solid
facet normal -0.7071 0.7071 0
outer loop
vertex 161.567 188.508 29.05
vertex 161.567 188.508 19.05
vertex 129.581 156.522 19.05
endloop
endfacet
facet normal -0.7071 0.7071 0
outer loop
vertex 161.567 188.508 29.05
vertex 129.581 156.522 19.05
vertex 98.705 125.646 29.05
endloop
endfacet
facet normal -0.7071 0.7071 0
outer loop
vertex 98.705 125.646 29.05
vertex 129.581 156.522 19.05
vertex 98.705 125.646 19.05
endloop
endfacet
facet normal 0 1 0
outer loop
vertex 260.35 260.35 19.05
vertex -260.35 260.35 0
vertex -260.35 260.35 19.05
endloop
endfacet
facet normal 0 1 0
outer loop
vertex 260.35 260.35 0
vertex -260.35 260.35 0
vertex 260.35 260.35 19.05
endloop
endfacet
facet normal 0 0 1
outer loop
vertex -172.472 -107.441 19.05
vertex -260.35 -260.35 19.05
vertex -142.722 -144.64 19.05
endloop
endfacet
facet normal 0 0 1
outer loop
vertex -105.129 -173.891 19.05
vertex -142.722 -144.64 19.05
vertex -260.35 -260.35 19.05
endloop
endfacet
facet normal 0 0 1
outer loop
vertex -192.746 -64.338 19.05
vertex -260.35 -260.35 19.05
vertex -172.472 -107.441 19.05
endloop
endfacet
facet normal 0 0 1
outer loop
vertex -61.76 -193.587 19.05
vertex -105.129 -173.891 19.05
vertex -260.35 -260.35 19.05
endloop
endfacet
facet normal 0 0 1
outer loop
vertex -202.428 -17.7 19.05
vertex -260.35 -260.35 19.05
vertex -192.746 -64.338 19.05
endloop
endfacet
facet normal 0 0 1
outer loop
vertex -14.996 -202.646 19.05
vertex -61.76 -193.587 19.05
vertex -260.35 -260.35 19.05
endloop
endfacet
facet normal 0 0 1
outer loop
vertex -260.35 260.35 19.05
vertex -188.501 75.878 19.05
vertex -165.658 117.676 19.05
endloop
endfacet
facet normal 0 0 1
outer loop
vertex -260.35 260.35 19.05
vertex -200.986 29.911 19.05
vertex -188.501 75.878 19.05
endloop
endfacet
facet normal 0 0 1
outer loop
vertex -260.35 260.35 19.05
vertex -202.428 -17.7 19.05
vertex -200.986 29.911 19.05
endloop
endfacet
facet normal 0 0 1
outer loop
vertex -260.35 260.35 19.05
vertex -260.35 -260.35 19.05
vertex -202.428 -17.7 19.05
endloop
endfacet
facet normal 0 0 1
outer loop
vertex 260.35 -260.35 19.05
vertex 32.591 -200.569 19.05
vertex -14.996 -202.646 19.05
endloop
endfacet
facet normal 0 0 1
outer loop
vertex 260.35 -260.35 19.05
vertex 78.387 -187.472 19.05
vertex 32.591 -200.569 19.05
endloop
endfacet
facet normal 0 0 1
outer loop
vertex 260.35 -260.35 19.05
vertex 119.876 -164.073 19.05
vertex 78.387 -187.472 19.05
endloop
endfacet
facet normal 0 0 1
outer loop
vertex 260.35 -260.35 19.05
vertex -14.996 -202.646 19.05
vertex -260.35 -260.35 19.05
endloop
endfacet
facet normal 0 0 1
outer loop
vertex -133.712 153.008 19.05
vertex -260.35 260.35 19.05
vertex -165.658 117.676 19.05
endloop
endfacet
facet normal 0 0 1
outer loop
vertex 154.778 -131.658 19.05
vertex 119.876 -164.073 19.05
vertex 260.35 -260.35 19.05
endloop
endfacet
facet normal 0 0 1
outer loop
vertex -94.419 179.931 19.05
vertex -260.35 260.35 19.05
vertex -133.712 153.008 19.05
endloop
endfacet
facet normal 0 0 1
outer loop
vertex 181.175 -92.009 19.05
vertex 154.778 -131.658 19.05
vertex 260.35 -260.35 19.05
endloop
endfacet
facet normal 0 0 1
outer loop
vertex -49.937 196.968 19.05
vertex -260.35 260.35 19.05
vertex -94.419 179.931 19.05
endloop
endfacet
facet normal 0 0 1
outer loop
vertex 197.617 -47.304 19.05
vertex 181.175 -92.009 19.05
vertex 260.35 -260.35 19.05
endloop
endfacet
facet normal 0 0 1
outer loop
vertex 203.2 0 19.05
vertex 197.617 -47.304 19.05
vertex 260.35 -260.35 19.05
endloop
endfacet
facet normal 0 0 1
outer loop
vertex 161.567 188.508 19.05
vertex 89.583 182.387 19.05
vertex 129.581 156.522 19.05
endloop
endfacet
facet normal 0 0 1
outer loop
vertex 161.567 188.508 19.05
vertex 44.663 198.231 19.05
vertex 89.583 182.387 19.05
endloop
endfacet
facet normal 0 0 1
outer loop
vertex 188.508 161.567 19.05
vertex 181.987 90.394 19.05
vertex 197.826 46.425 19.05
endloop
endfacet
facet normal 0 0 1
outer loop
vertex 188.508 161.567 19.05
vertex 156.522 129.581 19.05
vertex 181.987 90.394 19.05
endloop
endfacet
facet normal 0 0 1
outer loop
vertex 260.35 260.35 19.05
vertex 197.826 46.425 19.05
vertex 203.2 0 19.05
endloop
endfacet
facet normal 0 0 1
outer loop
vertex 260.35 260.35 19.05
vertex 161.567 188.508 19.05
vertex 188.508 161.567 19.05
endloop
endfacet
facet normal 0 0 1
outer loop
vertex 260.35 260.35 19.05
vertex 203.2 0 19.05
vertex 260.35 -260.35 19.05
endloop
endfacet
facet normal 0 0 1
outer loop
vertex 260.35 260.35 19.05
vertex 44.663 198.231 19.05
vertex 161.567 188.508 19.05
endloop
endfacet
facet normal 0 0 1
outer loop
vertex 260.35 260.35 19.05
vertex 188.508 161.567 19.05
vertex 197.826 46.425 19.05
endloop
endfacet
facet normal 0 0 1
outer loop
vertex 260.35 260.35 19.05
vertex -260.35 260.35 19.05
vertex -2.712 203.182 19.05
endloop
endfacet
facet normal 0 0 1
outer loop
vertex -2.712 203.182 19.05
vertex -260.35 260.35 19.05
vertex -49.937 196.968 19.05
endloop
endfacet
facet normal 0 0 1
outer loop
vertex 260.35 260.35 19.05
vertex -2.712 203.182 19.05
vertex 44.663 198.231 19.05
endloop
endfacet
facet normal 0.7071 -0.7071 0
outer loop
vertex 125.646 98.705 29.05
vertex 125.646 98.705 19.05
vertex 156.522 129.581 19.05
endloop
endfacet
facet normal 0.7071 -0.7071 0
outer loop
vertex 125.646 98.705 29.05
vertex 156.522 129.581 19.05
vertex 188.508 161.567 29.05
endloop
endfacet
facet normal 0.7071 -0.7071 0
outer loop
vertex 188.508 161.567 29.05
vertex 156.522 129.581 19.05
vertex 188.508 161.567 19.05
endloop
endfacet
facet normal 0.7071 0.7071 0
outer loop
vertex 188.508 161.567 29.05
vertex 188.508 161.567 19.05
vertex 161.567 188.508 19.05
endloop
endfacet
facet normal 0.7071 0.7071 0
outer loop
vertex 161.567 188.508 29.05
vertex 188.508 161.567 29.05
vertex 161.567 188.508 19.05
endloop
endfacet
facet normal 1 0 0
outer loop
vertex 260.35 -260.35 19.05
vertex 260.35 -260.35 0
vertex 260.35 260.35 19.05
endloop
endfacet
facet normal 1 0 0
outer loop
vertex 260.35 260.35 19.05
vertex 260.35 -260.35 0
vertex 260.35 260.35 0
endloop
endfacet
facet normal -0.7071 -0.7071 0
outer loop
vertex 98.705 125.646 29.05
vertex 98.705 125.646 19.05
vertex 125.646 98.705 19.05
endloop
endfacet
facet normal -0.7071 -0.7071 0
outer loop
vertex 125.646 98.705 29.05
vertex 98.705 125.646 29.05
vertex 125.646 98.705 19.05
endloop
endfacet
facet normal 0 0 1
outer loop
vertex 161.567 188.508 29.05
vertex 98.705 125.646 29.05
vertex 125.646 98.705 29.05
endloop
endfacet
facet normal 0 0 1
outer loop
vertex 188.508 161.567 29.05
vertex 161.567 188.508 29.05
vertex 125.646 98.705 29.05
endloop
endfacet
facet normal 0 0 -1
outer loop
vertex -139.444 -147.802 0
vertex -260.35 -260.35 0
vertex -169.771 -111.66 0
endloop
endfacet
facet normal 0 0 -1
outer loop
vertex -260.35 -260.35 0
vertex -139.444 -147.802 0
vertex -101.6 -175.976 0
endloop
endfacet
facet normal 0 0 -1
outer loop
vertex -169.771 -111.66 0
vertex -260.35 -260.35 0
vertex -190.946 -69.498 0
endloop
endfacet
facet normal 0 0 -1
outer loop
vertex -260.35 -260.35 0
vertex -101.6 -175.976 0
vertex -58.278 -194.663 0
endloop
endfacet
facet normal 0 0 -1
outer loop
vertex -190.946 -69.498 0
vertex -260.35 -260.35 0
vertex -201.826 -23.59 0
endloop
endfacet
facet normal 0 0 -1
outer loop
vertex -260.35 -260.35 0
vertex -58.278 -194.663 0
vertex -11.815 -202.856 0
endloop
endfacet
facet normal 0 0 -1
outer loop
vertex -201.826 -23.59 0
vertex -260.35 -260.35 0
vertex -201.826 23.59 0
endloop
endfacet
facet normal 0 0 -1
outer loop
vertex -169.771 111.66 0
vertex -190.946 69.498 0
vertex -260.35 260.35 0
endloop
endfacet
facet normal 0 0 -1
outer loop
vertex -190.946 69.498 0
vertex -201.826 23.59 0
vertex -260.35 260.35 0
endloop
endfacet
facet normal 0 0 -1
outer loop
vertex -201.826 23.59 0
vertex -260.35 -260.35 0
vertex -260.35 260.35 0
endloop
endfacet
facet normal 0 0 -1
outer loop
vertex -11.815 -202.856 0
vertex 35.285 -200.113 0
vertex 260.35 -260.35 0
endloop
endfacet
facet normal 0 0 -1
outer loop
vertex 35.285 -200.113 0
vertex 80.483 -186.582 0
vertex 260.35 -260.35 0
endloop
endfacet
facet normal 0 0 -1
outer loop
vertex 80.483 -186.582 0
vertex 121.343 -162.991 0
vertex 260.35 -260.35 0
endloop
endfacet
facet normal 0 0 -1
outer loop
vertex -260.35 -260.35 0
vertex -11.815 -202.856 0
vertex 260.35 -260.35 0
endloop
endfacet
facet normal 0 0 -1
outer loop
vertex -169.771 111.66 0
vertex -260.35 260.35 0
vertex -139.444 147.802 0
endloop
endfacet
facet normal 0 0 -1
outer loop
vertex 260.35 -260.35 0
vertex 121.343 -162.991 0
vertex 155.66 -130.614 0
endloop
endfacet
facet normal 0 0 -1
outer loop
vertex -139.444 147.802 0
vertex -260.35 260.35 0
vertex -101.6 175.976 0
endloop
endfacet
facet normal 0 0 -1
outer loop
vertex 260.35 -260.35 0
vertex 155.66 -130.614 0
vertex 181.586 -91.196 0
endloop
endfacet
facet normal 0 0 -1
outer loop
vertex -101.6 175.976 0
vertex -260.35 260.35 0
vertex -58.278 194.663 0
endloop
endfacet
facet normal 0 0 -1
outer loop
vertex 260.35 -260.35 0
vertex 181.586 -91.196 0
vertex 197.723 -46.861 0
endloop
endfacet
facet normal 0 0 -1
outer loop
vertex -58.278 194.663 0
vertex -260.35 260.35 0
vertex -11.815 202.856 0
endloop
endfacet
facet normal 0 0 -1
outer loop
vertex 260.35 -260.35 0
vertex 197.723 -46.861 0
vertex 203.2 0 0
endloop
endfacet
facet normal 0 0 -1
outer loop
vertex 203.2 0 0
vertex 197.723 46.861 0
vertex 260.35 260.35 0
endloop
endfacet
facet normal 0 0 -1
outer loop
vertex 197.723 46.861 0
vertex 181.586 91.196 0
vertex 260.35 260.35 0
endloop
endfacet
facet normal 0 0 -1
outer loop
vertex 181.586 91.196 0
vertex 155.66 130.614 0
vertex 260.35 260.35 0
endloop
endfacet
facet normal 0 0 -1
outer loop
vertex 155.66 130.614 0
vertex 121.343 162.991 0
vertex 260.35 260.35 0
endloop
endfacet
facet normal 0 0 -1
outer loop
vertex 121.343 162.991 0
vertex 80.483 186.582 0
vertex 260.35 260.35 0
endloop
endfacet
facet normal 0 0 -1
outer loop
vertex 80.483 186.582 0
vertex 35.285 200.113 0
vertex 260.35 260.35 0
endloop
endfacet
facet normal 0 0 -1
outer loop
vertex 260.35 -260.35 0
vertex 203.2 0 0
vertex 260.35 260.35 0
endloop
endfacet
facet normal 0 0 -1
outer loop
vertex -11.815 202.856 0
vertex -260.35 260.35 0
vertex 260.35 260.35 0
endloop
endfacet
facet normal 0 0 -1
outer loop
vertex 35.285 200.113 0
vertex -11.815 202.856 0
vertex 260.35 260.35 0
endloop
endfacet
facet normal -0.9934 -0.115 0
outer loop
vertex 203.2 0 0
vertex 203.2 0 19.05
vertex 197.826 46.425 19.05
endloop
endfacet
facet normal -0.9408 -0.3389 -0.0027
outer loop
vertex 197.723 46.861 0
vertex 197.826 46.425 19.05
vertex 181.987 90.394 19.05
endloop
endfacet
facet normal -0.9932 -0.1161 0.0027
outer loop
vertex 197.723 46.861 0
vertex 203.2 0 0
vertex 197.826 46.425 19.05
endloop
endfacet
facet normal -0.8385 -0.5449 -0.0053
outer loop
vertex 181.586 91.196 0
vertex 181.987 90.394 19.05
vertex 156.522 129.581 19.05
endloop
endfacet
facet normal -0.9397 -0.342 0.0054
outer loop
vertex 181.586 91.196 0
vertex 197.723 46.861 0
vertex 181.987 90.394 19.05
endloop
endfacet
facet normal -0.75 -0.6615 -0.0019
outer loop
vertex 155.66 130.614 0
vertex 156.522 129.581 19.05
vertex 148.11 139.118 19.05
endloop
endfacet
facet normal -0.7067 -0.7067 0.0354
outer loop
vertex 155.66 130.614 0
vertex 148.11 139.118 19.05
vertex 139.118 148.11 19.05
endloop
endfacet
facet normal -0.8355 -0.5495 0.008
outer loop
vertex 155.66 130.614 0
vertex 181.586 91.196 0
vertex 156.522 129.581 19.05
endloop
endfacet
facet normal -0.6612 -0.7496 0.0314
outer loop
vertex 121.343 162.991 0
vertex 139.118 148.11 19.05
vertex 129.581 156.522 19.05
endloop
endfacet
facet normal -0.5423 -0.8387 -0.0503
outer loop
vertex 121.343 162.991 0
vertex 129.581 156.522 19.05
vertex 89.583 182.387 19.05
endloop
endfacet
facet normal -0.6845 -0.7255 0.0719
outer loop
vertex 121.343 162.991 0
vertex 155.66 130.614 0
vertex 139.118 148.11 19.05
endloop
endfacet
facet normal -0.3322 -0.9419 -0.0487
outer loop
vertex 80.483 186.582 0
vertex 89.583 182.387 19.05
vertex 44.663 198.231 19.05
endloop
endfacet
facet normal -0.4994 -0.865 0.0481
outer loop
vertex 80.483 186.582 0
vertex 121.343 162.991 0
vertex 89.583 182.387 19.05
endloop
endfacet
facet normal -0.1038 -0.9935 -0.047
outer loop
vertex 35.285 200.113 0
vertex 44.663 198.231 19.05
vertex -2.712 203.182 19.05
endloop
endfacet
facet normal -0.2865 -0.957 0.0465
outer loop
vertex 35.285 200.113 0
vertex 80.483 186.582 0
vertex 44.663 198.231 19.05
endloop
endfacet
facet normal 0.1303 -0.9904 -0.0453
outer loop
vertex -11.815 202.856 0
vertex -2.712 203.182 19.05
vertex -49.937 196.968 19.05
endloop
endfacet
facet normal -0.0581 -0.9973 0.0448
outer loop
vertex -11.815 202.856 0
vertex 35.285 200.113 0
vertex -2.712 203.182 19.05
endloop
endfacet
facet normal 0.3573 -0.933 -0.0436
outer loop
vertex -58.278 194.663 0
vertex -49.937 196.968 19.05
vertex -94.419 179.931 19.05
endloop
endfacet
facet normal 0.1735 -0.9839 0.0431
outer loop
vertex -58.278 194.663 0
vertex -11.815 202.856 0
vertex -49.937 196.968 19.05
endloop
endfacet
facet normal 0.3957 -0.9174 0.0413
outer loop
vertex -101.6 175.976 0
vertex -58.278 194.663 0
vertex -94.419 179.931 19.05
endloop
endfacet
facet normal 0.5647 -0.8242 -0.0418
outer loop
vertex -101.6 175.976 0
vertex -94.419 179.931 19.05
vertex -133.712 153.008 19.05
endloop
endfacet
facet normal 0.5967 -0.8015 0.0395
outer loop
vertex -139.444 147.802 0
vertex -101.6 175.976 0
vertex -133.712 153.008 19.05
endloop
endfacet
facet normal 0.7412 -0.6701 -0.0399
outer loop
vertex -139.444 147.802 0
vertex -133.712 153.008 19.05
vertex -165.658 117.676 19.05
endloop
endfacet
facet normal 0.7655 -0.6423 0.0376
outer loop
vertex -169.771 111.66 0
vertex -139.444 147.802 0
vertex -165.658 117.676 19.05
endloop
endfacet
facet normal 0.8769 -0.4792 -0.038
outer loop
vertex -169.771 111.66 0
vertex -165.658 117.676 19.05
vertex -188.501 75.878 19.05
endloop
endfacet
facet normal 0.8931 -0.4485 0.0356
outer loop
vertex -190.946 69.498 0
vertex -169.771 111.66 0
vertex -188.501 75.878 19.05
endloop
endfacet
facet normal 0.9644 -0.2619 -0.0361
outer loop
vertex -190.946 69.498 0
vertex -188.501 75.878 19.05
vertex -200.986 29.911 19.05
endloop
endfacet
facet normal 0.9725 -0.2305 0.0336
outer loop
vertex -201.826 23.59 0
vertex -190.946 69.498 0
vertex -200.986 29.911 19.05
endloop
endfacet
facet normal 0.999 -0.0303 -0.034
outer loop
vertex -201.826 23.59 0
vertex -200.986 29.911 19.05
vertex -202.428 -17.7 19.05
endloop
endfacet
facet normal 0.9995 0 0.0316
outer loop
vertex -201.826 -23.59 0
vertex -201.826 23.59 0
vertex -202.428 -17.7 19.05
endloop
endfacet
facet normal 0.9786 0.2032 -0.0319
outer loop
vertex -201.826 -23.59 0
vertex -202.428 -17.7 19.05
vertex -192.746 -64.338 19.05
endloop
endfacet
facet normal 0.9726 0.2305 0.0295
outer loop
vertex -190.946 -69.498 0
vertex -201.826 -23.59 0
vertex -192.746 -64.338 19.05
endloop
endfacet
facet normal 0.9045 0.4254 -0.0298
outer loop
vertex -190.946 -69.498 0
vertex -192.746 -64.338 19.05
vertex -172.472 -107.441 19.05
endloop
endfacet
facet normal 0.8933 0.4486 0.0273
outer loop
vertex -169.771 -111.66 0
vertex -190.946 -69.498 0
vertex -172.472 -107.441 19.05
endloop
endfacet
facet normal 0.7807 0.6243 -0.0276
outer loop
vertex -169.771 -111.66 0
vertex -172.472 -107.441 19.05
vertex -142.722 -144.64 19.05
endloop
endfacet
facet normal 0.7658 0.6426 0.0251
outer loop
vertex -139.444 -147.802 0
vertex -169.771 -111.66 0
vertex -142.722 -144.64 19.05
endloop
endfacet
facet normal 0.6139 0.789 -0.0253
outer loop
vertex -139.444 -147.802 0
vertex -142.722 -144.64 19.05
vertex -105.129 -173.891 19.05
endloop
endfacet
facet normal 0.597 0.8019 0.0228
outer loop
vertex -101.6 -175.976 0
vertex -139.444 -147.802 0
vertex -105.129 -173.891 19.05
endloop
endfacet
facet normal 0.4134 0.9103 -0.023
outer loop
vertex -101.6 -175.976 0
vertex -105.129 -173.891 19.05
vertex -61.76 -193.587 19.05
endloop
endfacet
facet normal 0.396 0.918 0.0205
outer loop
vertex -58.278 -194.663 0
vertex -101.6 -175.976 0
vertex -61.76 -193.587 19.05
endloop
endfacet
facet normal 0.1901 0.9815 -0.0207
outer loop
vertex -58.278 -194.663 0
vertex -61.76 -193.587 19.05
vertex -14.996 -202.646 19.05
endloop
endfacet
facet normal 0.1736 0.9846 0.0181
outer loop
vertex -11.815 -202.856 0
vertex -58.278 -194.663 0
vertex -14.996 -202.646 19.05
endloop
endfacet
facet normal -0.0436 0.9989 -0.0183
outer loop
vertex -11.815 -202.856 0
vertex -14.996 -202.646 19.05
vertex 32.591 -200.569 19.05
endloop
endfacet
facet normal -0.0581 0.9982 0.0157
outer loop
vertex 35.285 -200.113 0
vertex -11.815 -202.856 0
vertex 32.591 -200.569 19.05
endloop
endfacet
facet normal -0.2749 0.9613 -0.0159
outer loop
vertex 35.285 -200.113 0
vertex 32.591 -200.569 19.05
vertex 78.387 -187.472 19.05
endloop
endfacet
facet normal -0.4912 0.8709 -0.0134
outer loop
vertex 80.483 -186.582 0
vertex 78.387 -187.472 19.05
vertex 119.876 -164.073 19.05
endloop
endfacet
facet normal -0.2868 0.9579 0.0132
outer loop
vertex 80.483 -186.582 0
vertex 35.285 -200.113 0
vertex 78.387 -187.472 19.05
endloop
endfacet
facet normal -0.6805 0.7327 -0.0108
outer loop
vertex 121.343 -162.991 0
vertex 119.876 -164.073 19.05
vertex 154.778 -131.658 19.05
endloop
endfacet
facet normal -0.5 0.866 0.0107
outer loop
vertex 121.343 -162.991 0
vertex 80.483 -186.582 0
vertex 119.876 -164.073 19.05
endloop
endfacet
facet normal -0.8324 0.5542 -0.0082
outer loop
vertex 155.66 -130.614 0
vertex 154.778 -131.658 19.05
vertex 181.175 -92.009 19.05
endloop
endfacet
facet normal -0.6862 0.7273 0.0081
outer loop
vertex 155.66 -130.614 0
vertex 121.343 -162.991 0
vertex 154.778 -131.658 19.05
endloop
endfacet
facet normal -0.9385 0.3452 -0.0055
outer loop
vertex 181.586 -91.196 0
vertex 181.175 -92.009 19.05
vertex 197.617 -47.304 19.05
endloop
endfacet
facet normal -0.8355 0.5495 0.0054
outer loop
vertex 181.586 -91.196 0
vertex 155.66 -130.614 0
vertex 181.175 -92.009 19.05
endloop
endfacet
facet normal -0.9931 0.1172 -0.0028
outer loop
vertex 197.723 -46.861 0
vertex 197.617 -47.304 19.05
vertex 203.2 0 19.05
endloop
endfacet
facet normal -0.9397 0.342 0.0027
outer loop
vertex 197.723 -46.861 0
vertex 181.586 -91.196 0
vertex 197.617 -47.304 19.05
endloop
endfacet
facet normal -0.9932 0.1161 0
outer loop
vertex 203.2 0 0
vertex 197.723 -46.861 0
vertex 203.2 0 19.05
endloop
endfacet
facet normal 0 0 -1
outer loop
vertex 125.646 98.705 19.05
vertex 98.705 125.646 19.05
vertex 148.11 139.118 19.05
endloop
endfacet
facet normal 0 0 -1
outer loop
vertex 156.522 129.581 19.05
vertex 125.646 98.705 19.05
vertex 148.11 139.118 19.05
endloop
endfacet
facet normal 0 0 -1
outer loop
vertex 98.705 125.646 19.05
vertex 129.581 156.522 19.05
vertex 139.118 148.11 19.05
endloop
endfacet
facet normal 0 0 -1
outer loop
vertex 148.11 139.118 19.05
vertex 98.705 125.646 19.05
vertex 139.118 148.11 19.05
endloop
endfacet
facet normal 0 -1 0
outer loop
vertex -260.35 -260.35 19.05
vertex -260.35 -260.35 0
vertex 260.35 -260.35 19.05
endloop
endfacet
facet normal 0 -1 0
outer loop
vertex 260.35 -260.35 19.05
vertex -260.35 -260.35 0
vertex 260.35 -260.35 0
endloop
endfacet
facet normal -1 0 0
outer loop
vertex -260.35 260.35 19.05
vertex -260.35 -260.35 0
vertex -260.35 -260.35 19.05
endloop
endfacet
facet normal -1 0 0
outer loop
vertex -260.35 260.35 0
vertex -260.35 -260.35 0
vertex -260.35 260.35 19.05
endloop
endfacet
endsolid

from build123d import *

# Parameters (mm, degrees)
F0_W     = 520.7
F0_H     = 520.7
F0_R     = 203.2
F1_DEPTH = 19.05
F3_DEPTH = 10


with BuildPart() as f1:
    # F0 (on Top) → F1 (new body)
    with BuildSketch(Plane.XY):
        Rectangle(F0_W, F0_H)
        Circle(F0_R, mode=Mode.SUBTRACT)
    extrude(amount=F1_DEPTH)

    # F2 (on face) → F3 (join)
    with BuildSketch(Plane.XY.offset(19.05)):
        Polygon((98.70539, 125.646158), (125.646158, 98.70539), (188.507951, 161.567183), (161.567183, 188.507951), align=None)
    extrude(amount=F3_DEPTH)


solid = f1.part
